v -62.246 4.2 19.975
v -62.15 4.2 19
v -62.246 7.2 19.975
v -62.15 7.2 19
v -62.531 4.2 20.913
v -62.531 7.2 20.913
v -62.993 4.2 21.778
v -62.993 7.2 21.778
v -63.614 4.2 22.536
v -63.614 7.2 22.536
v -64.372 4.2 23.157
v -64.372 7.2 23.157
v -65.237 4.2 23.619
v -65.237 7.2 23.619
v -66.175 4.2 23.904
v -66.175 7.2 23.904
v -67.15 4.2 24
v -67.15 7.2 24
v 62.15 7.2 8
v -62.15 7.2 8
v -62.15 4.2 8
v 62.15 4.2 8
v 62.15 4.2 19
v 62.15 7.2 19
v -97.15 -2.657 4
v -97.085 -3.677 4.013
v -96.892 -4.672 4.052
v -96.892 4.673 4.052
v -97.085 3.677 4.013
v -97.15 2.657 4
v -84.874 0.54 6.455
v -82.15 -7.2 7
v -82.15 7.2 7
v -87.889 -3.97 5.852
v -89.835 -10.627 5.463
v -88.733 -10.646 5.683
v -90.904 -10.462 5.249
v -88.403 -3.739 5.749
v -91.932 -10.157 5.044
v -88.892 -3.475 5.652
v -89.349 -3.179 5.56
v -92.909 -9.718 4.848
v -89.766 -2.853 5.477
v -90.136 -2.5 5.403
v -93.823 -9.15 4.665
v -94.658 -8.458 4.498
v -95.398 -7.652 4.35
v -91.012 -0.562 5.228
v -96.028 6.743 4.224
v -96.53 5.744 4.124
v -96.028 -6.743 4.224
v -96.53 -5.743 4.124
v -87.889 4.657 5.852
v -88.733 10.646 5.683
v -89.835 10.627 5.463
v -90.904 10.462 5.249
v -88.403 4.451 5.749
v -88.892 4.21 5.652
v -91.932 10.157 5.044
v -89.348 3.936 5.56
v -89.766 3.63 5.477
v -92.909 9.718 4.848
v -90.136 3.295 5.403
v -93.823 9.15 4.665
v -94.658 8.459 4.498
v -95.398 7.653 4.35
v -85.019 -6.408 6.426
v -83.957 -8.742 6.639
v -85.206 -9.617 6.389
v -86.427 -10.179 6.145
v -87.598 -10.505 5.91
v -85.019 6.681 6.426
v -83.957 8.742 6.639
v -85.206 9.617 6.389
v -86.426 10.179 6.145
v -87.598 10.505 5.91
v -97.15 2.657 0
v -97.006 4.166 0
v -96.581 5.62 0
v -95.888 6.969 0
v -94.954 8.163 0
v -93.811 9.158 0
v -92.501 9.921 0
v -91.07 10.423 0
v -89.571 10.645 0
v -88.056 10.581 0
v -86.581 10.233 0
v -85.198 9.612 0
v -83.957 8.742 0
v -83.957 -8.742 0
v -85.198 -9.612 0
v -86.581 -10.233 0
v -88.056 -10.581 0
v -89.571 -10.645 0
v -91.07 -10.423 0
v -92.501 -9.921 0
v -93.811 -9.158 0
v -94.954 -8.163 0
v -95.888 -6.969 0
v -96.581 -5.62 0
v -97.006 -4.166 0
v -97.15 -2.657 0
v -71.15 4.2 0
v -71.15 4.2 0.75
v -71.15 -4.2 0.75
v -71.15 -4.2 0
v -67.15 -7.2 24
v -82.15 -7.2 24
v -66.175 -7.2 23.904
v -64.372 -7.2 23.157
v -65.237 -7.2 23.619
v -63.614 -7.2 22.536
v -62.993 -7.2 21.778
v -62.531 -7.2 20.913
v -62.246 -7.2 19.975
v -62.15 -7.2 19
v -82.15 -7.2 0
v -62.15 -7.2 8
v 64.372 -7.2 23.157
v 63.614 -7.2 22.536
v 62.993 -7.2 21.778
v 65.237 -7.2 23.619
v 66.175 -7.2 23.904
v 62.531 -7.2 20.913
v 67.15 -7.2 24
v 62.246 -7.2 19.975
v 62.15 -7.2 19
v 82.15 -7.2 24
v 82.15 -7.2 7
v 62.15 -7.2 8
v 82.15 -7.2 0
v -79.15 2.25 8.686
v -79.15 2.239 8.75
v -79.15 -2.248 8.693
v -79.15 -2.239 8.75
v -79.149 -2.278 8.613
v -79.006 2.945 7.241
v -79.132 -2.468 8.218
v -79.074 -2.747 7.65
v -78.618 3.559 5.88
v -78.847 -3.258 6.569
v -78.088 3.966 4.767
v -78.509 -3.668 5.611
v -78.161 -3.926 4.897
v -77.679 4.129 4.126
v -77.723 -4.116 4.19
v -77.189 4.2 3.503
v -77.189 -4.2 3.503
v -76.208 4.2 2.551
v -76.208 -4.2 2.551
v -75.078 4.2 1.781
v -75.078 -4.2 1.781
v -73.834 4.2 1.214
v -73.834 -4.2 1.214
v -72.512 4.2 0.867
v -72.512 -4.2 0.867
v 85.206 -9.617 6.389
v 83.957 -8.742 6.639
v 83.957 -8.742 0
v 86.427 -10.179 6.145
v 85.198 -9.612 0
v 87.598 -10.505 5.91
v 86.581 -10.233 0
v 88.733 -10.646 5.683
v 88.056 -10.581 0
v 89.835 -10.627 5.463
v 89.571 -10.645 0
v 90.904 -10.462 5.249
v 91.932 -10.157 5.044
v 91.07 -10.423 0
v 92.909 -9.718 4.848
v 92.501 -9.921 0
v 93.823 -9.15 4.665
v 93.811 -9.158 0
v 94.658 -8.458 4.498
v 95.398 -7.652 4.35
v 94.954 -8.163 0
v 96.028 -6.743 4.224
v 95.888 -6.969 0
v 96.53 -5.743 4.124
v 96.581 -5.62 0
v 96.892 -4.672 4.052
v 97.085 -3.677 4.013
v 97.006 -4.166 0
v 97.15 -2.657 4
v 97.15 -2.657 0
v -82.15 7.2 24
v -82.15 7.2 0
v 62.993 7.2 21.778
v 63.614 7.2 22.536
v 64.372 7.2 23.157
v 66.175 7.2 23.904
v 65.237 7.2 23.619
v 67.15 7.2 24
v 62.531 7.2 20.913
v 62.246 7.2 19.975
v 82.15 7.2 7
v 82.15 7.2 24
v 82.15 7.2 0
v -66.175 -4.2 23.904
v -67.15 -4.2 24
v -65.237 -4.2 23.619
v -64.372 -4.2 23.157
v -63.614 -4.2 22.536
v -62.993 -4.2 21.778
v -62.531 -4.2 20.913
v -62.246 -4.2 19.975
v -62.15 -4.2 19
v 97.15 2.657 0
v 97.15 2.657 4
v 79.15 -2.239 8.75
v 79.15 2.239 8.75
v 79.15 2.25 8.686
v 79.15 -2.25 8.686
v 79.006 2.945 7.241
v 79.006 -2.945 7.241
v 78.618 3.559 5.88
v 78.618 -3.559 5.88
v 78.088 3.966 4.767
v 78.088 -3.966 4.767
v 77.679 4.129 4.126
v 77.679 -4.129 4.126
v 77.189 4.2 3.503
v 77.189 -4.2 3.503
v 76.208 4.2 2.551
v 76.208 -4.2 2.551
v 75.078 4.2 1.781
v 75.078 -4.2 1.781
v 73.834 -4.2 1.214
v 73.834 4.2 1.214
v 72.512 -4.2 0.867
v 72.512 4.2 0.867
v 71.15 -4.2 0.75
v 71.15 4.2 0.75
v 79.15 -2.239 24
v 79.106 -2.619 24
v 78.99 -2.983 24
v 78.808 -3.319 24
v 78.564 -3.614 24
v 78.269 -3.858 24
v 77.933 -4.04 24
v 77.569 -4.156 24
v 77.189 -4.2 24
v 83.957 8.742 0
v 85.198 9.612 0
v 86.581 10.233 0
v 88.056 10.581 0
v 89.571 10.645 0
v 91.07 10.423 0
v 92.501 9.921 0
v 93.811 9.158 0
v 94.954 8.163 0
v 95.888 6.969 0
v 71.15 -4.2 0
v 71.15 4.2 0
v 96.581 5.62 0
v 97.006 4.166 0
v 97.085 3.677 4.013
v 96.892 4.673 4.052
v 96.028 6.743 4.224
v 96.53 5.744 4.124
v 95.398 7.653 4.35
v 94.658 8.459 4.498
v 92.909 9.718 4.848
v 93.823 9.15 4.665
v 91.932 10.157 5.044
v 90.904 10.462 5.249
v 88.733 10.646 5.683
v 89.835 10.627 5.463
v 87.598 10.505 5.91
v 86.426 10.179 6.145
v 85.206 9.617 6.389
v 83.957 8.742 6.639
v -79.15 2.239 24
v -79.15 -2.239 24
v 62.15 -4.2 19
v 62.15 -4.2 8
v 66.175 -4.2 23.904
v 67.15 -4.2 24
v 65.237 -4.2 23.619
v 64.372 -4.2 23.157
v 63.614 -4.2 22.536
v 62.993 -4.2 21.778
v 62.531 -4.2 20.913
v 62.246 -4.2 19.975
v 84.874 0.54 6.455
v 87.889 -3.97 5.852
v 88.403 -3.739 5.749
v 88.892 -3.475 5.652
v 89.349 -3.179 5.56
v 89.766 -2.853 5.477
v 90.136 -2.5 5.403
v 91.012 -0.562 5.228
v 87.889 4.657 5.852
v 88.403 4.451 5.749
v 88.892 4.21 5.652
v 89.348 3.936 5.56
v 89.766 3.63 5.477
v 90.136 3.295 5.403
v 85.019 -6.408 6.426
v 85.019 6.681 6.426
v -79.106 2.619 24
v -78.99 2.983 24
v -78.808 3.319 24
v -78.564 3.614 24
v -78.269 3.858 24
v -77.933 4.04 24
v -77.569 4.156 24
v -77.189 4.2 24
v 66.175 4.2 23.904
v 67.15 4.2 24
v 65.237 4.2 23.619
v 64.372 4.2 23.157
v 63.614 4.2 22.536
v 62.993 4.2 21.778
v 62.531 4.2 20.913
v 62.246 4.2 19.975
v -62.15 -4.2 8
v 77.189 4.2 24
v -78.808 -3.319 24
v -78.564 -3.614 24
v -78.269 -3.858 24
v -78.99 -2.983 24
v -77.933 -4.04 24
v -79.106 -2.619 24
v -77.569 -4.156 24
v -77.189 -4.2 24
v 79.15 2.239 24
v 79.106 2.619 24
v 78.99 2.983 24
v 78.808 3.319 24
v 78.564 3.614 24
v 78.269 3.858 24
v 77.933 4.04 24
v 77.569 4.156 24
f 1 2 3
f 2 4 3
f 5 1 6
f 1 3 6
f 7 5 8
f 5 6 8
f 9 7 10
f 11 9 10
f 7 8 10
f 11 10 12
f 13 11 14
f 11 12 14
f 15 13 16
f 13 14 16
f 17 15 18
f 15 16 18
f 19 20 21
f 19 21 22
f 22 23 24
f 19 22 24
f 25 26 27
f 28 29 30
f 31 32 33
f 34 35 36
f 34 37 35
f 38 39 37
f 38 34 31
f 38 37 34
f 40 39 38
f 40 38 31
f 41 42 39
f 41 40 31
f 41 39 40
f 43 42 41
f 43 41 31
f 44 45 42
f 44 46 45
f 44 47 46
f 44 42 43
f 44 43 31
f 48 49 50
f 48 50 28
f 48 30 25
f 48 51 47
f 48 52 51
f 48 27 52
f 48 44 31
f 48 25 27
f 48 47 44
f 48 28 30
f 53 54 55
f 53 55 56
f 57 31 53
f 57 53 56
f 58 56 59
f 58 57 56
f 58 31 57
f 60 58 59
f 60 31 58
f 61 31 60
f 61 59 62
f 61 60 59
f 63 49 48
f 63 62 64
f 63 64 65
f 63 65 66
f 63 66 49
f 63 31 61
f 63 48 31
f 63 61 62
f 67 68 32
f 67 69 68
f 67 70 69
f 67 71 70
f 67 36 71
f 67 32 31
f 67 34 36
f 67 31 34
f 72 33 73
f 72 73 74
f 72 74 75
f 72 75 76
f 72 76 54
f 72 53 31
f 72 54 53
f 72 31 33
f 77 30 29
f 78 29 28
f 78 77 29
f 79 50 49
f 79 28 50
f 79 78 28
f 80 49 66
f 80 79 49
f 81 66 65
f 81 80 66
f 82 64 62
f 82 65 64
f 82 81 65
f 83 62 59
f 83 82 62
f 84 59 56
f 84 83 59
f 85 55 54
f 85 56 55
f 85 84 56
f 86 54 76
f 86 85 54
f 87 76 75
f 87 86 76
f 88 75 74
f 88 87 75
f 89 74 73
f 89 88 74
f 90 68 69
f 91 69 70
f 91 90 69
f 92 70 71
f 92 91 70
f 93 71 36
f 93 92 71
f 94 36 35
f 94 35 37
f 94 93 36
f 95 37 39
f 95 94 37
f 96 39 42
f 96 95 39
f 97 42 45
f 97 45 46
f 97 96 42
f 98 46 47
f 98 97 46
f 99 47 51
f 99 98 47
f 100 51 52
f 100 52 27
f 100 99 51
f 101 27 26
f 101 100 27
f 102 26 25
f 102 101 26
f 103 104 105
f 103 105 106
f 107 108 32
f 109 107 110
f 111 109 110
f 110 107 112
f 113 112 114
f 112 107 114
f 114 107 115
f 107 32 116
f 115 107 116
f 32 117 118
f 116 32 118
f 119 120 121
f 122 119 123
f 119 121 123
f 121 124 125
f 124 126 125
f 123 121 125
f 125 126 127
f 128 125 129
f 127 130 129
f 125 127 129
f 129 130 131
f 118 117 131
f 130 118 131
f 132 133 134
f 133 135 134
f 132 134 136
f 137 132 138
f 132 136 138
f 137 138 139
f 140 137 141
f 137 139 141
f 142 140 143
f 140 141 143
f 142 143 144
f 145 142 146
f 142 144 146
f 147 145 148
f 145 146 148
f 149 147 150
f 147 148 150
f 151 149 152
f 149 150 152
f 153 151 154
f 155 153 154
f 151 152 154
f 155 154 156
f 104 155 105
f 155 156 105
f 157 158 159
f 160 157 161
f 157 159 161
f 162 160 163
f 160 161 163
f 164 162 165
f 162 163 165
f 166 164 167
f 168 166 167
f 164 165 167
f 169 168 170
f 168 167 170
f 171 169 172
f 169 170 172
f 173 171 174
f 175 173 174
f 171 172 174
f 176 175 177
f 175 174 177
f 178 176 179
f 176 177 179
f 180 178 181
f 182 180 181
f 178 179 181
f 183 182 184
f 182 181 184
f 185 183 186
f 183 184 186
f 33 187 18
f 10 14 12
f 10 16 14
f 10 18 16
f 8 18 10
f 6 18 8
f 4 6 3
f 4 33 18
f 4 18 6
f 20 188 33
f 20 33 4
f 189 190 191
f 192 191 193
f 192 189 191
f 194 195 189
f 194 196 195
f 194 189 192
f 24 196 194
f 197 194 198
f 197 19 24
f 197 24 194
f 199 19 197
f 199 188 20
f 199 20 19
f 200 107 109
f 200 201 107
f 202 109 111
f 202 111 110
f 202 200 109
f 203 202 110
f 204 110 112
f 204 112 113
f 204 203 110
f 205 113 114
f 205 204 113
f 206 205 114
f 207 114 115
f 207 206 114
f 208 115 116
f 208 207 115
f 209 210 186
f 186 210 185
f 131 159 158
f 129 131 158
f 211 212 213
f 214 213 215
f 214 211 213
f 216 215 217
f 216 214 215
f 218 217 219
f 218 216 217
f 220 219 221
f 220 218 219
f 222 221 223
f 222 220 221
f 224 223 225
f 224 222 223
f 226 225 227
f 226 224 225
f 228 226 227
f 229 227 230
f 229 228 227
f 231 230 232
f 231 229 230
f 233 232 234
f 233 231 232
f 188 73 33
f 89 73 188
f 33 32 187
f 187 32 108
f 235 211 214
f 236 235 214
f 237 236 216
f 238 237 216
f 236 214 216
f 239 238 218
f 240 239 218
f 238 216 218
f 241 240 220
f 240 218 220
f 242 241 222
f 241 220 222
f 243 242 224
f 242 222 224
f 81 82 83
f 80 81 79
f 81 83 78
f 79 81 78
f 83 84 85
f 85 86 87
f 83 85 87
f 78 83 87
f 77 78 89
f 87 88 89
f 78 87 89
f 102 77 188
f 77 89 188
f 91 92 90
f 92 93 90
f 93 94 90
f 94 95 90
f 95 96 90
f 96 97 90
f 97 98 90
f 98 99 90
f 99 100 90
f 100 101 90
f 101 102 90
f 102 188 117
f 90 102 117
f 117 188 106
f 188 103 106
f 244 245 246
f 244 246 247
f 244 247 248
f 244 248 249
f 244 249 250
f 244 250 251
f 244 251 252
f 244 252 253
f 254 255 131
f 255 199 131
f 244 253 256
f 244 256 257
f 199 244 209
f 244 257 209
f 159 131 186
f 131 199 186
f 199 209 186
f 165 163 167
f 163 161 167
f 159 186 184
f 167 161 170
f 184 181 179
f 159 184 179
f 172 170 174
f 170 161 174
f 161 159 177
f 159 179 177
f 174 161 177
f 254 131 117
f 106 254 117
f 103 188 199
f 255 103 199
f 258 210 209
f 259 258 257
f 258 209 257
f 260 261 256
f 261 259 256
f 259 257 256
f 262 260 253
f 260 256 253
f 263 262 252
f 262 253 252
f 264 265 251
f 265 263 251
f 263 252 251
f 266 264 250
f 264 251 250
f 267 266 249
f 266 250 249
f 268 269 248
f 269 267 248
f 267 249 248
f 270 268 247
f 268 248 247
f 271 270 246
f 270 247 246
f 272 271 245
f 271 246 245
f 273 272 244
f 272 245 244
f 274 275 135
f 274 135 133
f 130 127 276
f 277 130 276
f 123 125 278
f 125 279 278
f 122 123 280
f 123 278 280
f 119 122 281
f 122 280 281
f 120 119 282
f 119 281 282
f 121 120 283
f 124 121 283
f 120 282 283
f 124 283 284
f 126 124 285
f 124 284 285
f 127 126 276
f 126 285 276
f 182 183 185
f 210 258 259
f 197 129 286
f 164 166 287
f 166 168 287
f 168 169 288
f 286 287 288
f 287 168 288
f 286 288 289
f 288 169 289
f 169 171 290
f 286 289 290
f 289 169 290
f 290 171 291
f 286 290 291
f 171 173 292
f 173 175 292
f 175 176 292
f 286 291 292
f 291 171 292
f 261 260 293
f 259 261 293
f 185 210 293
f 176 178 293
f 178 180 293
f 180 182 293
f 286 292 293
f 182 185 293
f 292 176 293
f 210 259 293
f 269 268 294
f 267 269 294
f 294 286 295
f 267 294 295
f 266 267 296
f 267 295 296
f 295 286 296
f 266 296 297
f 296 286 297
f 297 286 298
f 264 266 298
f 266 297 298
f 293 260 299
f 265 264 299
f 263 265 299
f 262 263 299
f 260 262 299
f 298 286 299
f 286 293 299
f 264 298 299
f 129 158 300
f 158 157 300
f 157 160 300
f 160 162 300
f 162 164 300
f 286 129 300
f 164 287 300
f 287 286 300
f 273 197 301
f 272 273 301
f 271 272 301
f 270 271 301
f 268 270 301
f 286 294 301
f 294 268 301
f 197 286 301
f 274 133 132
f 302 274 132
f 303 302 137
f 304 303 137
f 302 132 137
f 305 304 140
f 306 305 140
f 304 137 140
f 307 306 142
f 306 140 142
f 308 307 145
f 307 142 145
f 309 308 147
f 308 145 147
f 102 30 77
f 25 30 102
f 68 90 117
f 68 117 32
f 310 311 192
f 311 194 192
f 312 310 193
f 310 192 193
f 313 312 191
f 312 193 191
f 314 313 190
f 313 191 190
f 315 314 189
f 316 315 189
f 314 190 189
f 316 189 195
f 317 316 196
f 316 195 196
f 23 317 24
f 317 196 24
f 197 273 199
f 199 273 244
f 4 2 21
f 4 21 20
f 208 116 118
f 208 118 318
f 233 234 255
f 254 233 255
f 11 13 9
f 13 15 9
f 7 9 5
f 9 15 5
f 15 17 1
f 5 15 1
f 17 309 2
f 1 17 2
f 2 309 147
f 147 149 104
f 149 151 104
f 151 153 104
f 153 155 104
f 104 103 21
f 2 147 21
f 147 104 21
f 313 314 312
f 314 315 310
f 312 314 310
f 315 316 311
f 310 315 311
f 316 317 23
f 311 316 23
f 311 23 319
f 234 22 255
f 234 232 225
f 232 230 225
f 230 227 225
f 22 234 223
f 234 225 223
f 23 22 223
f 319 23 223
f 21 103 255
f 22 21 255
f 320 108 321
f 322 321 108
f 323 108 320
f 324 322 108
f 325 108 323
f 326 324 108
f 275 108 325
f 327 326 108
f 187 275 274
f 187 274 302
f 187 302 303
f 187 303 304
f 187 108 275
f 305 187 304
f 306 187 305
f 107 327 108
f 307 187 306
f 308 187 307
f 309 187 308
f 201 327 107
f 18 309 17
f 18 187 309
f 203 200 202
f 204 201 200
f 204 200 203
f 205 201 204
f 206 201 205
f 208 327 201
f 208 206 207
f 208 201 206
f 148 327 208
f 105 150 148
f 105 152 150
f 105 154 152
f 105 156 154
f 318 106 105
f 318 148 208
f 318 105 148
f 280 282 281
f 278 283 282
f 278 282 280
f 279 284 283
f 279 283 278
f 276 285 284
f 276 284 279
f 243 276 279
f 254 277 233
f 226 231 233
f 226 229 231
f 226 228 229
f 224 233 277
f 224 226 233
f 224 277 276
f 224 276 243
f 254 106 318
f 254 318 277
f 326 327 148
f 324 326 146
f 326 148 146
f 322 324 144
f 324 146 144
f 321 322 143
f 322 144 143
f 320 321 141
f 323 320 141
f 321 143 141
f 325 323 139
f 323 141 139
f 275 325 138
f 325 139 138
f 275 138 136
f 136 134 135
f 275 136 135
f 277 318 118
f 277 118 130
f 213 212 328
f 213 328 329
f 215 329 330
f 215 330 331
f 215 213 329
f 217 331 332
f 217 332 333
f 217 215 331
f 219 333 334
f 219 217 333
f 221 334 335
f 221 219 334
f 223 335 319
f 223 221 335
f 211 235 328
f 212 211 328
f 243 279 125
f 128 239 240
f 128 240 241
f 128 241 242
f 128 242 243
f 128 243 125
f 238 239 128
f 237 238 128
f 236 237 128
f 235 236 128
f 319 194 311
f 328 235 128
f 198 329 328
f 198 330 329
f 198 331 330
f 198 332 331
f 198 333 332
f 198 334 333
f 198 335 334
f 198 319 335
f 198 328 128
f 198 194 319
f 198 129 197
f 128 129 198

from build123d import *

# Parameters (mm, degrees)
F1_W         = 164.3
F1_H         = 14.4
F1_W_2       = 158.3
F1_H_2       = 8.4
F2_DEPTH     = 24
F3_T1_DEPTH  = 24
F5_DEPTH     = 4.35
F6_W         = 14.4
F6_H         = 7
F8_W         = 40
F8_H         = 4
F10_T1_DEPTH = 90.717403587
F11_W        = 124.3
F11_H        = 14.4
F12_DEPTH    = 16
F13_R        = 5


# Not quite as in the source:
# - a fillet or chamfer that OpenCascade refuses, or shapes differently, is made with other operations: its cross-section is extruded or revolved along the edge and cut away or added
# - a pattern or mirror of a feature is missing from the dataset's text; its kind, count and spacing are read off the source's solid


with BuildPart() as f2:
    # F1 (on Top) → F2 (new body)
    with BuildSketch(Plane.XY):
        Rectangle(F1_W, F1_H)
        Rectangle(F1_W_2, F1_H_2, mode=Mode.SUBTRACT)
    extrude(amount=F2_DEPTH)

    # F3: fillet of radius 2 on 4 edges, made by hand

    # F3_s2 → F3_t1 (join)
    with BuildSketch(Plane.XY):
        with BuildLine():
            ThreePointArc((79.1504, -2.1990343146), (78.5642135624, -3.6142135624), (77.1490343146, -4.2004))
            Line((77.1490343146, -4.2004), (77.1490343146, -4.4005365685))
            ThreePointArc((77.1490343146, -4.4005365685), (78.1495171573, -4.4001365685), (79.15, -4.4001365685))
            Line((79.15, -4.4001365685), (79.3501365685, -4.2))
            ThreePointArc((79.3501365685, -4.2), (79.3501365685, -3.1995171573), (79.3505365685, -2.1990343146))
            Line((79.3505365685, -2.1990343146), (79.1504, -2.1990343146))
        make_face()
        with BuildLine():
            ThreePointArc((79.1504, 2.1990343146), (78.5642135624, 3.6142135624), (77.1490343146, 4.2004))
            Line((77.1490343146, 4.2004), (77.1490343146, 4.4005365685))
            ThreePointArc((77.1490343146, 4.4005365685), (78.1495171573, 4.4001365685), (79.15, 4.4001365685))
            Line((79.15, 4.4001365685), (79.3501365685, 4.2))
            ThreePointArc((79.3501365685, 4.2), (79.3501365685, 3.1995171573), (79.3505365685, 2.1990343146))
            Line((79.3505365685, 2.1990343146), (79.1504, 2.1990343146))
        make_face()
        with BuildLine():
            ThreePointArc((-77.1490343146, -4.2004), (-78.5642135624, -3.6142135624), (-79.1504, -2.1990343146))
            Line((-79.1504, -2.1990343146), (-79.3505365685, -2.1990343146))
            ThreePointArc((-79.3505365685, -2.1990343146), (-79.3501365685, -3.1995171573), (-79.3501365685, -4.2))
            Line((-79.3501365685, -4.2), (-79.15, -4.4001365685))
            ThreePointArc((-79.15, -4.4001365685), (-78.1495171573, -4.4001365685), (-77.1490343146, -4.4005365685))
            Line((-77.1490343146, -4.4005365685), (-77.1490343146, -4.2004))
        make_face()
        with BuildLine():
            ThreePointArc((-79.1504, 2.1990343146), (-78.5642135624, 3.6142135624), (-77.1490343146, 4.2004))
            Line((-77.1490343146, 4.2004), (-77.1490343146, 4.4005365685))
            ThreePointArc((-77.1490343146, 4.4005365685), (-78.1495171573, 4.4001365685), (-79.15, 4.4001365685))
            Line((-79.15, 4.4001365685), (-79.3501365685, 4.2))
            ThreePointArc((-79.3501365685, 4.2), (-79.3501365685, 3.1995171573), (-79.3505365685, 2.1990343146))
            Line((-79.3505365685, 2.1990343146), (-79.1504, 2.1990343146))
        make_face()
    extrude(amount=F3_T1_DEPTH)

    # F4 (on Front) → F5 (join, symmetric)
    with BuildSketch(Plane.XZ):
        with BuildLine():
            ThreePointArc((79.15, 8.75), (76.8068542495, 3.0931457505), (71.15, 0.75))
            Line((71.15, 0.75), (71.15, 0))
            Line((71.15, 0), (82.15, 0))
            Line((82.15, 0), (82.15, 8.75))
            Line((82.15, 8.75), (79.15, 8.75))
        make_face()
    f5 = extrude(amount=F5_DEPTH, both=True)

    # F5_copies: F5 across plane
    add(f5.mirror(Plane(origin=(0, 0, 0), x_dir=(0, 0, -1), z_dir=(-1, 0, 0))))

    # F6 (on face) → F9 section 0
    with BuildSketch(Plane(origin=(-82.15, 0, 0), x_dir=(0, -1, 0), z_dir=(-1, 0, 0))):
        with Locations((0, 3.5)):
            Rectangle(F6_W, F6_H)
    # F8 (on offset) → F9 section 1
    with BuildSketch(Plane(origin=(-97.15, 0, 0), x_dir=(0, -1, 0), z_dir=(-1, 0, 0))):
        with Locations((0, 2)):
            Rectangle(F8_W, F8_H)
    f9 = loft()

    # F9_copies: F9 across plane
    add(f9.mirror(Plane(origin=(0, 0, 0), x_dir=(0, 0, 1), z_dir=(1, 0, 0))))

    # F10: fillet of radius 8 on 4 edges, made by hand

    # F10_s2 → F10_t1 (cut)
    with BuildSketch(Plane.XY.offset(-43.3587017935)):
        with BuildLine():
            ThreePointArc((-97.15, 2.6565192826), (-92.500848152, 9.9209405715), (-83.9570458344, 8.7420124454))
            Line((-83.9570458344, 8.7420124454), (-97.15, 20))
            Line((-97.15, 20), (-97.15, 2.6565192826))
        make_face()
        with BuildLine():
            ThreePointArc((-83.9570458344, -8.7420124454), (-92.500848152, -9.9209405715), (-97.15, -2.6565192826))
            Line((-97.15, -2.6565192826), (-97.15, -20))
            Line((-97.15, -20), (-83.9570458344, -8.7420124454))
        make_face()
        with BuildLine():
            ThreePointArc((83.9570458344, -8.7420124454), (92.500848152, -9.9209405715), (97.15, -2.6565192826))
            Line((97.15, -2.6565192826), (97.15, -20))
            Line((97.15, -20), (83.9570458344, -8.7420124454))
        make_face()
        with BuildLine():
            ThreePointArc((97.15, 2.6565192826), (92.500848152, 9.9209405715), (83.9570458344, 8.7420124454))
            Line((83.9570458344, 8.7420124454), (97.15, 20))
            Line((97.15, 20), (97.15, 2.6565192826))
        make_face()
    extrude(amount=F10_T1_DEPTH, mode=Mode.SUBTRACT)

    # F11 (on face) → F12 (cut)
    with BuildSketch(Plane.XY.offset(24)):
        Rectangle(F11_W, F11_H)
    extrude(amount=-F12_DEPTH, mode=Mode.SUBTRACT)

    # F13
    f13_edges = [f2.edges().sort_by_distance(p)[0] for p in [
        (-62.15, 5.7, 24),
        (-62.15, -5.7, 24),
        (62.15, 5.7, 24),
        (62.15, -5.7, 24),
    ]]
    fillet(f13_edges, radius=F13_R)


solid = f2.part
